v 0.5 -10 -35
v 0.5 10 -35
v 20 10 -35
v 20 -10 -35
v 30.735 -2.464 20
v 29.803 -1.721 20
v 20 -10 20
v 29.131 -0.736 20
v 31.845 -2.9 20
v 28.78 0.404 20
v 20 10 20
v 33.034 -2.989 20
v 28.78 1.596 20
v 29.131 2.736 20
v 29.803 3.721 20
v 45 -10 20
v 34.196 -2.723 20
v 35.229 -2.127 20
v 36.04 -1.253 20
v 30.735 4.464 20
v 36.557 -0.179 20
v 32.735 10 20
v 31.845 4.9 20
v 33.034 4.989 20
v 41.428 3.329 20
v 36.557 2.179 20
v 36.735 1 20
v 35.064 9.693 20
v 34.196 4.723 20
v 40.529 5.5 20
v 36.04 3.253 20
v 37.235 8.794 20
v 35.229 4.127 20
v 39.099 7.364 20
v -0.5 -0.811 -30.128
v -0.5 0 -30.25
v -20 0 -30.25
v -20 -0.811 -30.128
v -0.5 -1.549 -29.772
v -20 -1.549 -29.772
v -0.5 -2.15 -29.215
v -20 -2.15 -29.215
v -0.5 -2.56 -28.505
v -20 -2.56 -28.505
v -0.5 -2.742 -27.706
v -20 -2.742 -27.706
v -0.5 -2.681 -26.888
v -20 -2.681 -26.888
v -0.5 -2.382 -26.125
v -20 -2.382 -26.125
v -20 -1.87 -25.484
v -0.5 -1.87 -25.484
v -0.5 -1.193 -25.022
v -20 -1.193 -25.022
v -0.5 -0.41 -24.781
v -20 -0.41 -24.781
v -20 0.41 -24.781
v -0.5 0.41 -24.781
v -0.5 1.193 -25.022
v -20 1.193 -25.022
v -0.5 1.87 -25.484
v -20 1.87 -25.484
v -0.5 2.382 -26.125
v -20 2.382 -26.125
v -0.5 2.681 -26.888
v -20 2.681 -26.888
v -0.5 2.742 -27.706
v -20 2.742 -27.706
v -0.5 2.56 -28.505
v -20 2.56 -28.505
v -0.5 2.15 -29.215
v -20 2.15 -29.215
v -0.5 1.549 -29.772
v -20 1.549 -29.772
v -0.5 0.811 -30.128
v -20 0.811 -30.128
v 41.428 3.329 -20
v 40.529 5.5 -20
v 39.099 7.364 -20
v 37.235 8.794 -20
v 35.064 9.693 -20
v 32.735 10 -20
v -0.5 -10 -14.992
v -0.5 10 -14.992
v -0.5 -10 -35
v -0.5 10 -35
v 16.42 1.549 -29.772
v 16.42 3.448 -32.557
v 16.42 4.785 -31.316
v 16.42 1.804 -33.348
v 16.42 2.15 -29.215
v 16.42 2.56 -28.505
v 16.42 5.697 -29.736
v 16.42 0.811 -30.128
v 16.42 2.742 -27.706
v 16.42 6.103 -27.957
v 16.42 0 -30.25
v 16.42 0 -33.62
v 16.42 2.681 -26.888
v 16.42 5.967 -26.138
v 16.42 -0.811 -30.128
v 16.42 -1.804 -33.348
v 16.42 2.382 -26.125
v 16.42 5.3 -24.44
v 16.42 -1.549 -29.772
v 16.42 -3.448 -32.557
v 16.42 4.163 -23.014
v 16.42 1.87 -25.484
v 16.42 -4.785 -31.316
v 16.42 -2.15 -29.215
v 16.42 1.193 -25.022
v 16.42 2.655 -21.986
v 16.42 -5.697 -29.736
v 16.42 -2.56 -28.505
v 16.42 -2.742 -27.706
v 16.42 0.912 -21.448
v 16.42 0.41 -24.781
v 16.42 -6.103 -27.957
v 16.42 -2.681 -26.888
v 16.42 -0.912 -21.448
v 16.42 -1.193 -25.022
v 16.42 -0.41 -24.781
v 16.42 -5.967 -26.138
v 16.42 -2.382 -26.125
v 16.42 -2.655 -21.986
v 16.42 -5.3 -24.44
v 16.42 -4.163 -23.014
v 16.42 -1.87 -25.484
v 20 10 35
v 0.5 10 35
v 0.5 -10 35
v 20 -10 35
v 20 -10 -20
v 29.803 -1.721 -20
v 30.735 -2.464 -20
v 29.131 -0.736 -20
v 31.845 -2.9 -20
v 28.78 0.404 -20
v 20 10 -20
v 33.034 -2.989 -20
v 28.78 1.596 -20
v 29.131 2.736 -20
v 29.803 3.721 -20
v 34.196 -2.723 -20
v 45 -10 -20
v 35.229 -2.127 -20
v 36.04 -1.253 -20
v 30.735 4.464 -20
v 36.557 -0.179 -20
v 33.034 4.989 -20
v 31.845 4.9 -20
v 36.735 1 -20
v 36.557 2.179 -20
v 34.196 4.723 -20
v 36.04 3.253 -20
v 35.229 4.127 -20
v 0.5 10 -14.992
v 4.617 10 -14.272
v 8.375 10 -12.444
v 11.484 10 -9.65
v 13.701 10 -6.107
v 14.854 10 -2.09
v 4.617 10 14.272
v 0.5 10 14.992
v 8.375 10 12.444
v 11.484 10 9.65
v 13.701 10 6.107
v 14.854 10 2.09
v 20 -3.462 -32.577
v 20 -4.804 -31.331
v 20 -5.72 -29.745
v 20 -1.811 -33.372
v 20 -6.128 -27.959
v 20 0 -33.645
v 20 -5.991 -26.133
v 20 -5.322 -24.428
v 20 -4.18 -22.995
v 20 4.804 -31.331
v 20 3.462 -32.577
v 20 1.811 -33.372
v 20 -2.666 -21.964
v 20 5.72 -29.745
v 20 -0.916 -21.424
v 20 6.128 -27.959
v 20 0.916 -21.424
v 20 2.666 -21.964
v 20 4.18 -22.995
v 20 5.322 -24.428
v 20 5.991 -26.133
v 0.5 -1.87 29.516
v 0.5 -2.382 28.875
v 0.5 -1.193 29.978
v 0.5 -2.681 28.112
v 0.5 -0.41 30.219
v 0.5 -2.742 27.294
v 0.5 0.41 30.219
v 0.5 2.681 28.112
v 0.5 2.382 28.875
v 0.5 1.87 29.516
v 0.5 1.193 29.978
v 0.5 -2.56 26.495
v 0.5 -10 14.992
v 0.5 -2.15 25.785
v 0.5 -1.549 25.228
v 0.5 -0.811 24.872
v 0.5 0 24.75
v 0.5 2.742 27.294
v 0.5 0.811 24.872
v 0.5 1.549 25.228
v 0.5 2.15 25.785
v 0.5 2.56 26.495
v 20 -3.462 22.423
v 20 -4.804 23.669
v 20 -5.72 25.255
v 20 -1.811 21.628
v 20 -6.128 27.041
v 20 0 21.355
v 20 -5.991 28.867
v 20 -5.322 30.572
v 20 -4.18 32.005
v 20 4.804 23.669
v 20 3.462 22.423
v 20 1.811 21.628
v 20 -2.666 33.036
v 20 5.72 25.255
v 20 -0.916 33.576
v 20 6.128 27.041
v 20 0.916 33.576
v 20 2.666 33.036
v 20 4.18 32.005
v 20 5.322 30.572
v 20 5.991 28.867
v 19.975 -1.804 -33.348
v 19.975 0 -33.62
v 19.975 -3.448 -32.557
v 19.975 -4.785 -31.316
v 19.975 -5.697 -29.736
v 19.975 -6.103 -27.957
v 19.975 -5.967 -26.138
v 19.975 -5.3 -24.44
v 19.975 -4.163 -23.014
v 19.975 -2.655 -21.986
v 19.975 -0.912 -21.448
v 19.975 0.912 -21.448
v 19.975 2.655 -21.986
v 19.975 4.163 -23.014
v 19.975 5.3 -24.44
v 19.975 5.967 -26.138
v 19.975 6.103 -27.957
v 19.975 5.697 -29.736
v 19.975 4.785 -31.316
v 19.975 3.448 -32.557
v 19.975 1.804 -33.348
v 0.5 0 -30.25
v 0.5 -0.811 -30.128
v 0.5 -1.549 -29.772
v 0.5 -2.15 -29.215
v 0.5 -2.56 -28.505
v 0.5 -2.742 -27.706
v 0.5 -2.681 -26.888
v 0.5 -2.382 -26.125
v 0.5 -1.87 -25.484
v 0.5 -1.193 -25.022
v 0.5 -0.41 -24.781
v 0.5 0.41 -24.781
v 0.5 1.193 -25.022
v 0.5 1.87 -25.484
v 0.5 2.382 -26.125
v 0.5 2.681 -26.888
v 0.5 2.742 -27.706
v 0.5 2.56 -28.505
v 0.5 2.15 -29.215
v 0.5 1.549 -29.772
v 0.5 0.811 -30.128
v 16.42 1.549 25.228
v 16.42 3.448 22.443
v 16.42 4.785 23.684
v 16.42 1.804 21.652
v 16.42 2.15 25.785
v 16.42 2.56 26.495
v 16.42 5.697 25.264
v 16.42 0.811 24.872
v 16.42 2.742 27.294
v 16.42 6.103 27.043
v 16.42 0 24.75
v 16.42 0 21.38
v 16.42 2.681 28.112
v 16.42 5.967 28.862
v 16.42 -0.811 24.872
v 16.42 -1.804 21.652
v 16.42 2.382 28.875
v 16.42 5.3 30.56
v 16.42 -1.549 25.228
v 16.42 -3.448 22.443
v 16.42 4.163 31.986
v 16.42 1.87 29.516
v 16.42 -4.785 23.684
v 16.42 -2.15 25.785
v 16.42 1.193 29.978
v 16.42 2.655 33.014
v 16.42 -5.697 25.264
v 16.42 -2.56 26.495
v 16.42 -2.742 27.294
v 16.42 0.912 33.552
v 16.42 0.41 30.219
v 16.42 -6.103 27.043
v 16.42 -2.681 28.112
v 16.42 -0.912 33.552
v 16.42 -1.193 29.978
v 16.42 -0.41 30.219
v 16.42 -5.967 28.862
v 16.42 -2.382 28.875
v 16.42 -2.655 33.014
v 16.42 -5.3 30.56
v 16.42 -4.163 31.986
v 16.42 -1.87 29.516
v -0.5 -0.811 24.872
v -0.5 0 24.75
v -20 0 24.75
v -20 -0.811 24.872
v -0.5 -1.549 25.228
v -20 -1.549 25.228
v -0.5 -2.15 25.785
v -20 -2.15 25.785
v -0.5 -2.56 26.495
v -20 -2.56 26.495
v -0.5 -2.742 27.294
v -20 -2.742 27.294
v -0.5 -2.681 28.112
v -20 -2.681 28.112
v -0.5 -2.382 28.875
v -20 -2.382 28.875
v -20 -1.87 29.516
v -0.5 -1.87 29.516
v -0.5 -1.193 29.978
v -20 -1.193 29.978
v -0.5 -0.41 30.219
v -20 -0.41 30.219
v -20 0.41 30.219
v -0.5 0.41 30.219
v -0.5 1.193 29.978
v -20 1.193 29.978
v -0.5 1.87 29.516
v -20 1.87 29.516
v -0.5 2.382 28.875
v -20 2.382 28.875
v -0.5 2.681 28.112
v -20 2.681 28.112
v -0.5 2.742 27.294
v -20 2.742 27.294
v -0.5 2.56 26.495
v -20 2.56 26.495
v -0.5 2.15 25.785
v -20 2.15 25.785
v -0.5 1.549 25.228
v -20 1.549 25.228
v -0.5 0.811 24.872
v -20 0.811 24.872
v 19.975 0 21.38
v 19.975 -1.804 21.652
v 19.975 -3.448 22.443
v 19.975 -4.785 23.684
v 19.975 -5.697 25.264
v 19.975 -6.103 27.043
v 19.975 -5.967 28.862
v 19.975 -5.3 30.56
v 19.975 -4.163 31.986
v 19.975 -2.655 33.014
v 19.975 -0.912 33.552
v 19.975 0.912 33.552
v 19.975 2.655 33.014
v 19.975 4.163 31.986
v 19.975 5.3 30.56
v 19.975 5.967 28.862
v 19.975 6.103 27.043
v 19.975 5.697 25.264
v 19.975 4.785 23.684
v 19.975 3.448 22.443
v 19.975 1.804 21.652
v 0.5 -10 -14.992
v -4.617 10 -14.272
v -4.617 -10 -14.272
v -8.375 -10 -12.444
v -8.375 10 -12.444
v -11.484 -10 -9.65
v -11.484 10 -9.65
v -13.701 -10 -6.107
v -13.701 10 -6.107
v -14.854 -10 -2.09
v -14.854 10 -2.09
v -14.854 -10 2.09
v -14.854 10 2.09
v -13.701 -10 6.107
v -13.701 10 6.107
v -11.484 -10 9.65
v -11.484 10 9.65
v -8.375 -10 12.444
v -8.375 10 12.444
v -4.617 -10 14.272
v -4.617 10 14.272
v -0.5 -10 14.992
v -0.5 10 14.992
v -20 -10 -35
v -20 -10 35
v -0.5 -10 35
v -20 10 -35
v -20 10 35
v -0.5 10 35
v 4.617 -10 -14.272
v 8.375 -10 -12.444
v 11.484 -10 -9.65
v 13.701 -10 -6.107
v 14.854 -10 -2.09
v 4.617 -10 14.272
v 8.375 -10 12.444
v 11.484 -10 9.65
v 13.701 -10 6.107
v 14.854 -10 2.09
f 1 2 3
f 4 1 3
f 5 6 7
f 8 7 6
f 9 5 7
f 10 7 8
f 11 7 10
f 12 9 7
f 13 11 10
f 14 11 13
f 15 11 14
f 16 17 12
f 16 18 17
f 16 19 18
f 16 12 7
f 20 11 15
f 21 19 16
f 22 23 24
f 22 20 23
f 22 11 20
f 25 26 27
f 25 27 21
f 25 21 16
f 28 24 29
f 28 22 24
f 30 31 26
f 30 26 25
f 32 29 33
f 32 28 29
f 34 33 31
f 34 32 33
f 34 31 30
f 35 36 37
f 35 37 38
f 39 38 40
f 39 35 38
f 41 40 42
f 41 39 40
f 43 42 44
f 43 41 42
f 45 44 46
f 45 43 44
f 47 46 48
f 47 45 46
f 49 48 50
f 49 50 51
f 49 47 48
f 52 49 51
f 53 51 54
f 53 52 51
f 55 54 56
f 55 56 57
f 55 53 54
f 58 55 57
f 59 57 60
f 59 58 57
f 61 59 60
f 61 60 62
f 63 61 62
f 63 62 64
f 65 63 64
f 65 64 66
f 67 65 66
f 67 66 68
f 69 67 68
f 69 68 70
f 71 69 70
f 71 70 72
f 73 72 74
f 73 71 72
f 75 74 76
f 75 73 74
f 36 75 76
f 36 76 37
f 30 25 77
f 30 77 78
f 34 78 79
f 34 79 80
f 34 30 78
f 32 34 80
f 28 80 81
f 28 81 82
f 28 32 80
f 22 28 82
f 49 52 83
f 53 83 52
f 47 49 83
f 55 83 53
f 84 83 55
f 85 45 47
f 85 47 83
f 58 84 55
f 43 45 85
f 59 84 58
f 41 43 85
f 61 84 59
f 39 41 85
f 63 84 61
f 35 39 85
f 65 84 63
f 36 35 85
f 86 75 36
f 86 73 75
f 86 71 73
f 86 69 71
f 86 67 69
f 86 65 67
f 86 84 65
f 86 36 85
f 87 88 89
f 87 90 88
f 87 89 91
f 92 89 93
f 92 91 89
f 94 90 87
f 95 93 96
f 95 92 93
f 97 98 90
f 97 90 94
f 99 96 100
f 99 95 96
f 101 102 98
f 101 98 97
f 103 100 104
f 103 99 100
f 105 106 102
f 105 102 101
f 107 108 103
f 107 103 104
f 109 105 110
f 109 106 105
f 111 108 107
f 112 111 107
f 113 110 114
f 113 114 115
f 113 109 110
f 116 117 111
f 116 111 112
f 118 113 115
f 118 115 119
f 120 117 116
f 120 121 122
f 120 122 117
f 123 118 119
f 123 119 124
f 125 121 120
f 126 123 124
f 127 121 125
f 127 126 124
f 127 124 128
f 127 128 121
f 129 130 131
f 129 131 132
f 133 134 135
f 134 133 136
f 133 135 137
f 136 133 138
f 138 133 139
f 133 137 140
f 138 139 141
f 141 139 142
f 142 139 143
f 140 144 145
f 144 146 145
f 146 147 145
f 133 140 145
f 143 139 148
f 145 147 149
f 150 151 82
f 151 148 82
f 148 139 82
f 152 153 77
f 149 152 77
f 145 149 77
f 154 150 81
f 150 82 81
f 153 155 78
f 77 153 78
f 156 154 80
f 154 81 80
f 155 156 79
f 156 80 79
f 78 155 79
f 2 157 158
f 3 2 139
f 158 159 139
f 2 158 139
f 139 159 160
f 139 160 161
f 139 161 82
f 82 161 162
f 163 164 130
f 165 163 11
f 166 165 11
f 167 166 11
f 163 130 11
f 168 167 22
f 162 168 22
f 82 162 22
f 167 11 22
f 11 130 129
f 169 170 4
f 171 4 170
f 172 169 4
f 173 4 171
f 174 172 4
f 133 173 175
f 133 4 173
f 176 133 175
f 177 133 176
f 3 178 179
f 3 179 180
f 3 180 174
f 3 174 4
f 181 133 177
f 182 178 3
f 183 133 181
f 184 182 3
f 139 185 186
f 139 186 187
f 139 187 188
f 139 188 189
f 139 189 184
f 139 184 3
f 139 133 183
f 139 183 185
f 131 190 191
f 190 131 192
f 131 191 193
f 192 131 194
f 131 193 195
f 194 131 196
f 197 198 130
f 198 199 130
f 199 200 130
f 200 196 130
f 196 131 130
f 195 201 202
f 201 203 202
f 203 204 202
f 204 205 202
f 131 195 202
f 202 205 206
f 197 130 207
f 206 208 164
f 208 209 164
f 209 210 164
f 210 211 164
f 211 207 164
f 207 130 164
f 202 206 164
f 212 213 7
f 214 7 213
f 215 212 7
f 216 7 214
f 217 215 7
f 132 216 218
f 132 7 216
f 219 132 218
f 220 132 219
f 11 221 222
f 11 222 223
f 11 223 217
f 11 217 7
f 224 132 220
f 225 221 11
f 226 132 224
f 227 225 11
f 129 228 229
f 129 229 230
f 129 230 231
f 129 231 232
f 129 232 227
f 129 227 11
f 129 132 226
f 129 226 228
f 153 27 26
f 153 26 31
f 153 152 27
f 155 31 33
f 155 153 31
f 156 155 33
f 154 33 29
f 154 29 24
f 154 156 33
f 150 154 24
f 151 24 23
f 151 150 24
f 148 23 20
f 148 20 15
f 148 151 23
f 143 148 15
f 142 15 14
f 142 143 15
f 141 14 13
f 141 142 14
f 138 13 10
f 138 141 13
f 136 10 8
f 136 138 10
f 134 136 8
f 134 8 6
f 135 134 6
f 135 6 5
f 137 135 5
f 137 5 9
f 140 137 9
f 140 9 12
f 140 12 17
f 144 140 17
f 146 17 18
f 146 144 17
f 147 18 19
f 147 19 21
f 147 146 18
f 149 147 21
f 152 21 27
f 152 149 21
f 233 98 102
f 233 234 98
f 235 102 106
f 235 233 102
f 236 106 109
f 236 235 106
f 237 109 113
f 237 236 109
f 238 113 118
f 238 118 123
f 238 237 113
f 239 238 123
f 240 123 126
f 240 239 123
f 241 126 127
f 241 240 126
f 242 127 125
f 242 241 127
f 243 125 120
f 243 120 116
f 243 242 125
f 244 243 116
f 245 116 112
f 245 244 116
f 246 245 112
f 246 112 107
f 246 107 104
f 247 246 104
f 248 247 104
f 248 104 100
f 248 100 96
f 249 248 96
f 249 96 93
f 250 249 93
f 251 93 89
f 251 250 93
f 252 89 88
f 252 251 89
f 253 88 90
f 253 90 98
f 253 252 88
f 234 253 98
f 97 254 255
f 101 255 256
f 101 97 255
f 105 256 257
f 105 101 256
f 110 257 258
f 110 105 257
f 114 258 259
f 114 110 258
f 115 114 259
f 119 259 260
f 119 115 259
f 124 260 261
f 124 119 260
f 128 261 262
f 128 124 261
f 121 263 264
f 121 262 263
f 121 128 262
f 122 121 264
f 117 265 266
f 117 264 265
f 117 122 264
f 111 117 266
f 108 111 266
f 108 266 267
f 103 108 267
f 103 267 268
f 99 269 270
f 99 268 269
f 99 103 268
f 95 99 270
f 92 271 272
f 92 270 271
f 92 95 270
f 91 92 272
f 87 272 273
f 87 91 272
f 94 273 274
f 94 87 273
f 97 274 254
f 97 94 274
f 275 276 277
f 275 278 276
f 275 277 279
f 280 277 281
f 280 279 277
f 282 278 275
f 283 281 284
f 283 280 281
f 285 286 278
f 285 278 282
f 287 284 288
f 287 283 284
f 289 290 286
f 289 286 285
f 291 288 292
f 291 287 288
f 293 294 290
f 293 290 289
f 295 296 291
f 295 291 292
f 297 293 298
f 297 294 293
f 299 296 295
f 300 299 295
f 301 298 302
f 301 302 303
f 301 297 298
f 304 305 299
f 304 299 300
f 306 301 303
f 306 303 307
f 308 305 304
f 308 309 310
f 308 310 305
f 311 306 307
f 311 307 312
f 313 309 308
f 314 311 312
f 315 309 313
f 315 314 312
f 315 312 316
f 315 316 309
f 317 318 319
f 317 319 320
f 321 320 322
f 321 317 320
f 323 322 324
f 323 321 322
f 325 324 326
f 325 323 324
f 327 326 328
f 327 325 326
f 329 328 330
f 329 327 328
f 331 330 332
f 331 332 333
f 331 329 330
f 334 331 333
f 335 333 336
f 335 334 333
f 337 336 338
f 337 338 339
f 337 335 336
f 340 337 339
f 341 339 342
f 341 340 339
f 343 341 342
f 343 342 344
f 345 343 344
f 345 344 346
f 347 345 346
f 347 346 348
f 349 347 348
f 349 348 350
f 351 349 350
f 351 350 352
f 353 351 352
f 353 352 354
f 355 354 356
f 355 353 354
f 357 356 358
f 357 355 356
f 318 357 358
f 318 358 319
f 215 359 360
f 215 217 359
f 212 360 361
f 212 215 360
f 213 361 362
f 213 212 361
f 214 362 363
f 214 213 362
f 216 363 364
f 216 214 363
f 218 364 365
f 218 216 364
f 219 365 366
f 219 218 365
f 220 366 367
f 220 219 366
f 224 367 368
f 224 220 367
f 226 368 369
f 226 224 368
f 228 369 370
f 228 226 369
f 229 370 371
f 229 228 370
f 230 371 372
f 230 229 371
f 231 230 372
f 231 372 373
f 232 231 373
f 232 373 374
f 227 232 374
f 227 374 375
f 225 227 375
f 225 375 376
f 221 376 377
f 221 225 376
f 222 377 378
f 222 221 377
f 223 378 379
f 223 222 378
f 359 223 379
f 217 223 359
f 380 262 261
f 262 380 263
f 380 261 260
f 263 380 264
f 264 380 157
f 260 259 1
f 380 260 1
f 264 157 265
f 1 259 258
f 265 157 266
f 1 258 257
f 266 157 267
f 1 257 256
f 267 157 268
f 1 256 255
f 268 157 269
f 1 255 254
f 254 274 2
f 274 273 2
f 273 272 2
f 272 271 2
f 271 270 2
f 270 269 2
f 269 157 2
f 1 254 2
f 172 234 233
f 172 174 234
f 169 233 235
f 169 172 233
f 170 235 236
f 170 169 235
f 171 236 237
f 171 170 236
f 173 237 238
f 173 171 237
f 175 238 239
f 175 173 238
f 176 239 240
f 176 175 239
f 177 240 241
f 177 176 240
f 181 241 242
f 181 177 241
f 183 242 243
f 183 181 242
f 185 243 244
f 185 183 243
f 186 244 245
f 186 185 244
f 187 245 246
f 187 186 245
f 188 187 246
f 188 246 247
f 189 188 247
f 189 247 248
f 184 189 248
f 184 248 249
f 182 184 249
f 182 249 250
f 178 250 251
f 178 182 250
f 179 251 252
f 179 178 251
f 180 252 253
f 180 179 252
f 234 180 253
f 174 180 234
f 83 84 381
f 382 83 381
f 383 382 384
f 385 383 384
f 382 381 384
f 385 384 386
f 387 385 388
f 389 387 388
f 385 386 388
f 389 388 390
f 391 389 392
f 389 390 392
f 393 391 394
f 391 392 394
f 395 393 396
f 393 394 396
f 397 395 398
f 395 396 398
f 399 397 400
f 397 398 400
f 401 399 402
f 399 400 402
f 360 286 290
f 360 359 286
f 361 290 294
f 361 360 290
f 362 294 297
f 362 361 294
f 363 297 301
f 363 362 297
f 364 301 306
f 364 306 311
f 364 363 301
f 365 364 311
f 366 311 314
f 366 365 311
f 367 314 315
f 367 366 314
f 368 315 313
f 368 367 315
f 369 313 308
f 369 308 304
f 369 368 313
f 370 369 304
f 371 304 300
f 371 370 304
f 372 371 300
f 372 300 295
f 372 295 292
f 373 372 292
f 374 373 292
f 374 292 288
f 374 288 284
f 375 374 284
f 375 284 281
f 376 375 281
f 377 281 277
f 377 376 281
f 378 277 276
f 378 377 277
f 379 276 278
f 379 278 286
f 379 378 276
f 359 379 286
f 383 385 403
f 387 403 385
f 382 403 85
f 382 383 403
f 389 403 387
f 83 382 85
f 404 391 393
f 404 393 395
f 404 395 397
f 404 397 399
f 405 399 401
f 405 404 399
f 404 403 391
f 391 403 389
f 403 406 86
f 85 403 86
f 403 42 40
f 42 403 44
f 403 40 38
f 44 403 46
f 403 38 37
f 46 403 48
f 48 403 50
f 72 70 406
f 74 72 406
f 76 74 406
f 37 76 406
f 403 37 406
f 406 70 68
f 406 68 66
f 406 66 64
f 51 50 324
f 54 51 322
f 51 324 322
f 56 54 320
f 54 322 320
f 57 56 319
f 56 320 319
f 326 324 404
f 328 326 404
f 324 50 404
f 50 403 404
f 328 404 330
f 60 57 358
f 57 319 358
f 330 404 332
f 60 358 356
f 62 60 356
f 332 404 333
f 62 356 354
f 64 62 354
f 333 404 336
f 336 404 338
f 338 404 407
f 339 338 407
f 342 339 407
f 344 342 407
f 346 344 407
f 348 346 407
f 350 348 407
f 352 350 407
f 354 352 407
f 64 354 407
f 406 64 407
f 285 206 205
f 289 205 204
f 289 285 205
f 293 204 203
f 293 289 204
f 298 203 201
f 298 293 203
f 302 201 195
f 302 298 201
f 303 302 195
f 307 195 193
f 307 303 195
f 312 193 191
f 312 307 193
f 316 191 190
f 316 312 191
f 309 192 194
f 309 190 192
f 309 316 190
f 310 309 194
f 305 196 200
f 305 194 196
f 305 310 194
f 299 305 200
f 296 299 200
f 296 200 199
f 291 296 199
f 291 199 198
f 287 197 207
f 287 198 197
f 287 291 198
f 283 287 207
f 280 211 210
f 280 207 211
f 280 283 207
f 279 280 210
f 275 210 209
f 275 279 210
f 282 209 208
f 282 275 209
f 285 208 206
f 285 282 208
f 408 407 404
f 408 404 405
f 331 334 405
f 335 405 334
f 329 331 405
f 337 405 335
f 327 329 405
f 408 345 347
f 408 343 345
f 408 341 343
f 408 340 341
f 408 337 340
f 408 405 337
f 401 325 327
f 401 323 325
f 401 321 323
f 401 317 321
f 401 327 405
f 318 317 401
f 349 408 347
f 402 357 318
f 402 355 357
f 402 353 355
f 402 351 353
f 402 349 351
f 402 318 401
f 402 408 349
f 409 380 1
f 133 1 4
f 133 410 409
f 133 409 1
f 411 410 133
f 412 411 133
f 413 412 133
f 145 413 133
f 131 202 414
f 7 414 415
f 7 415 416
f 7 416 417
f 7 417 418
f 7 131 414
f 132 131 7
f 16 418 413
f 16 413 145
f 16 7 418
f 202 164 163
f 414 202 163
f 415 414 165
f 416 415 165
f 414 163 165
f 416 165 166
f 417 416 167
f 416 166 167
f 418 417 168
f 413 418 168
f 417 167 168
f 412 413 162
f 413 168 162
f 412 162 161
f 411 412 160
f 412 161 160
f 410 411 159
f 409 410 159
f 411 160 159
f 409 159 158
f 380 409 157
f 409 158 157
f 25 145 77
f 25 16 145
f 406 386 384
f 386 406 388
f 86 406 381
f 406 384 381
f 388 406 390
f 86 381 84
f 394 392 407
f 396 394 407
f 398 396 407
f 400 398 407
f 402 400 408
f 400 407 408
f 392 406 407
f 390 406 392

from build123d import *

# Parameters (mm, degrees)
SKETCH1_W                              = 40
SKETCH1_H                              = 20
BOSS_EXTRUDE2_DEPTH                    = 35
SKETCH1_3_R                            = 4
BOSS_EXTRUDE3_DEPTH                    = 20
CUT_EXTRUDE1_DEPTH                     = 61.415229868
CBORE_FOR_M5_HEX_HEAD_BOLT1_AT_2_COUNT = 2
CBORE_FOR_M5_HEX_HEAD_BOLT1_AT_2_PITCH = 55


with BuildPart() as part:
    # Sketch1 → Boss-Extrude2 (new, symmetric)
    with BuildSketch(Plane.XY):
        Rectangle(SKETCH1_W, SKETCH1_H)
    extrude(amount=BOSS_EXTRUDE2_DEPTH, both=True)

    # Sketch1<3> → Boss-Extrude3 (add, symmetric)
    with BuildSketch(Plane.XY):
        with BuildLine():
            Line((20, 10), (20, -10))
            Line((20, -10), (45, -10))
            Line((45, -10), (41.428405696, 3.329371406))
            ThreePointArc((41.428405696, 3.329371406), (38.213926121, 8.140180063), (32.73507326, 10))
            Line((32.73507326, 10), (20, 10))
        make_face()
        with Locations((32.73507326, 1)):
            Circle(SKETCH1_3_R, mode=Mode.SUBTRACT)
    extrude(amount=BOSS_EXTRUDE3_DEPTH, both=True)

    # Sketch2 → Cut-Extrude1 (cut, through all)
    with BuildSketch(Plane(origin=(0, 10, 0), x_dir=(1, 0, 0), z_dir=(0, 1, 0))):
        with BuildLine():
            Line((0.5, 35), (-0.5, 35))
            Line((-0.5, 35), (-0.5, 14.991664351))
            ThreePointArc((-0.5, 14.991664351), (-15, 0), (-0.5, -14.991664351))
            Line((-0.5, -14.991664351), (-0.5, -35))
            Line((-0.5, -35), (0.5, -35))
            Line((0.5, -35), (0.5, -14.991664351))
            ThreePointArc((0.5, -14.991664351), (15, 0), (0.5, 14.991664351))
            Line((0.5, 14.991664351), (0.5, 35))
        make_face()
    extrude(amount=-CUT_EXTRUDE1_DEPTH, mode=Mode.SUBTRACT)


with BuildPart() as cut_extrude1_piece_1:
    # of the separate pieces the step leaves, piece 1, a body of its own (cut_extrude1_pieces)
    add(part.part.solids().sort_by_distance((0.5, -10, -35))[0])


with BuildPart() as cut_extrude1_piece_2:
    # of the separate pieces the step leaves, piece 2, a body of its own (cut_extrude1_pieces)
    add(part.part.solids().sort_by_distance((-20, -10, 35))[0])


with BuildPart() as cbore_for_m5_hex_head_bolt1_tool:
    # Sketch8 → CBORE for M5 Hex Head Bolt1 (revolve)
    with BuildSketch(Plane(origin=(20, 0, 27.5), x_dir=(0, 0, -1), z_dir=(0, 1, 0))):
        Polygon((0, 0), (0, 40), (2.75, 40), (2.75, 3.58), (6.12, 3.58), (6.12, 0.025), (6.145, 0), align=None)
    cbore_for_m5_hex_head_bolt1 = revolve(axis=Axis((26.35, 0, 27.5), (-1, 0, 0)))


with BuildPart() as cut_extrude1_piece_1_1:
    add(cut_extrude1_piece_1.part)

    # CBORE for M5 Hex Head Bolt1: cut by cbore_for_m5_hex_head_bolt1_tool
    add(cbore_for_m5_hex_head_bolt1_tool.part, mode=Mode.SUBTRACT)


with BuildPart() as cut_extrude1_piece_2_1:
    add(cut_extrude1_piece_2.part)

    # CBORE for M5 Hex Head Bolt1: cut by cbore_for_m5_hex_head_bolt1_tool
    add(cbore_for_m5_hex_head_bolt1_tool.part, mode=Mode.SUBTRACT)


with BuildPart() as cbore_for_m5_hex_head_bolt1_at_2_tool:
    # CBORE for M5 Hex Head Bolt1 at 2: CBORE for M5 Hex Head Bolt1 ×2
    with Locations(*[(0, 0, -i * CBORE_FOR_M5_HEX_HEAD_BOLT1_AT_2_PITCH) for i in range(1, CBORE_FOR_M5_HEX_HEAD_BOLT1_AT_2_COUNT)]):
        add(cbore_for_m5_hex_head_bolt1)


with BuildPart() as cut_extrude1_piece_1_2:
    add(cut_extrude1_piece_1_1.part)

    # CBORE for M5 Hex Head Bolt1 at 2: cut by cbore_for_m5_hex_head_bolt1_at_2_tool
    add(cbore_for_m5_hex_head_bolt1_at_2_tool.part, mode=Mode.SUBTRACT)


with BuildPart() as cut_extrude1_piece_2_2:
    add(cut_extrude1_piece_2_1.part)

    # CBORE for M5 Hex Head Bolt1 at 2: cut by cbore_for_m5_hex_head_bolt1_at_2_tool
    add(cbore_for_m5_hex_head_bolt1_at_2_tool.part, mode=Mode.SUBTRACT)


solid = Compound([cut_extrude1_piece_1_2.part, cut_extrude1_piece_2_2.part])
